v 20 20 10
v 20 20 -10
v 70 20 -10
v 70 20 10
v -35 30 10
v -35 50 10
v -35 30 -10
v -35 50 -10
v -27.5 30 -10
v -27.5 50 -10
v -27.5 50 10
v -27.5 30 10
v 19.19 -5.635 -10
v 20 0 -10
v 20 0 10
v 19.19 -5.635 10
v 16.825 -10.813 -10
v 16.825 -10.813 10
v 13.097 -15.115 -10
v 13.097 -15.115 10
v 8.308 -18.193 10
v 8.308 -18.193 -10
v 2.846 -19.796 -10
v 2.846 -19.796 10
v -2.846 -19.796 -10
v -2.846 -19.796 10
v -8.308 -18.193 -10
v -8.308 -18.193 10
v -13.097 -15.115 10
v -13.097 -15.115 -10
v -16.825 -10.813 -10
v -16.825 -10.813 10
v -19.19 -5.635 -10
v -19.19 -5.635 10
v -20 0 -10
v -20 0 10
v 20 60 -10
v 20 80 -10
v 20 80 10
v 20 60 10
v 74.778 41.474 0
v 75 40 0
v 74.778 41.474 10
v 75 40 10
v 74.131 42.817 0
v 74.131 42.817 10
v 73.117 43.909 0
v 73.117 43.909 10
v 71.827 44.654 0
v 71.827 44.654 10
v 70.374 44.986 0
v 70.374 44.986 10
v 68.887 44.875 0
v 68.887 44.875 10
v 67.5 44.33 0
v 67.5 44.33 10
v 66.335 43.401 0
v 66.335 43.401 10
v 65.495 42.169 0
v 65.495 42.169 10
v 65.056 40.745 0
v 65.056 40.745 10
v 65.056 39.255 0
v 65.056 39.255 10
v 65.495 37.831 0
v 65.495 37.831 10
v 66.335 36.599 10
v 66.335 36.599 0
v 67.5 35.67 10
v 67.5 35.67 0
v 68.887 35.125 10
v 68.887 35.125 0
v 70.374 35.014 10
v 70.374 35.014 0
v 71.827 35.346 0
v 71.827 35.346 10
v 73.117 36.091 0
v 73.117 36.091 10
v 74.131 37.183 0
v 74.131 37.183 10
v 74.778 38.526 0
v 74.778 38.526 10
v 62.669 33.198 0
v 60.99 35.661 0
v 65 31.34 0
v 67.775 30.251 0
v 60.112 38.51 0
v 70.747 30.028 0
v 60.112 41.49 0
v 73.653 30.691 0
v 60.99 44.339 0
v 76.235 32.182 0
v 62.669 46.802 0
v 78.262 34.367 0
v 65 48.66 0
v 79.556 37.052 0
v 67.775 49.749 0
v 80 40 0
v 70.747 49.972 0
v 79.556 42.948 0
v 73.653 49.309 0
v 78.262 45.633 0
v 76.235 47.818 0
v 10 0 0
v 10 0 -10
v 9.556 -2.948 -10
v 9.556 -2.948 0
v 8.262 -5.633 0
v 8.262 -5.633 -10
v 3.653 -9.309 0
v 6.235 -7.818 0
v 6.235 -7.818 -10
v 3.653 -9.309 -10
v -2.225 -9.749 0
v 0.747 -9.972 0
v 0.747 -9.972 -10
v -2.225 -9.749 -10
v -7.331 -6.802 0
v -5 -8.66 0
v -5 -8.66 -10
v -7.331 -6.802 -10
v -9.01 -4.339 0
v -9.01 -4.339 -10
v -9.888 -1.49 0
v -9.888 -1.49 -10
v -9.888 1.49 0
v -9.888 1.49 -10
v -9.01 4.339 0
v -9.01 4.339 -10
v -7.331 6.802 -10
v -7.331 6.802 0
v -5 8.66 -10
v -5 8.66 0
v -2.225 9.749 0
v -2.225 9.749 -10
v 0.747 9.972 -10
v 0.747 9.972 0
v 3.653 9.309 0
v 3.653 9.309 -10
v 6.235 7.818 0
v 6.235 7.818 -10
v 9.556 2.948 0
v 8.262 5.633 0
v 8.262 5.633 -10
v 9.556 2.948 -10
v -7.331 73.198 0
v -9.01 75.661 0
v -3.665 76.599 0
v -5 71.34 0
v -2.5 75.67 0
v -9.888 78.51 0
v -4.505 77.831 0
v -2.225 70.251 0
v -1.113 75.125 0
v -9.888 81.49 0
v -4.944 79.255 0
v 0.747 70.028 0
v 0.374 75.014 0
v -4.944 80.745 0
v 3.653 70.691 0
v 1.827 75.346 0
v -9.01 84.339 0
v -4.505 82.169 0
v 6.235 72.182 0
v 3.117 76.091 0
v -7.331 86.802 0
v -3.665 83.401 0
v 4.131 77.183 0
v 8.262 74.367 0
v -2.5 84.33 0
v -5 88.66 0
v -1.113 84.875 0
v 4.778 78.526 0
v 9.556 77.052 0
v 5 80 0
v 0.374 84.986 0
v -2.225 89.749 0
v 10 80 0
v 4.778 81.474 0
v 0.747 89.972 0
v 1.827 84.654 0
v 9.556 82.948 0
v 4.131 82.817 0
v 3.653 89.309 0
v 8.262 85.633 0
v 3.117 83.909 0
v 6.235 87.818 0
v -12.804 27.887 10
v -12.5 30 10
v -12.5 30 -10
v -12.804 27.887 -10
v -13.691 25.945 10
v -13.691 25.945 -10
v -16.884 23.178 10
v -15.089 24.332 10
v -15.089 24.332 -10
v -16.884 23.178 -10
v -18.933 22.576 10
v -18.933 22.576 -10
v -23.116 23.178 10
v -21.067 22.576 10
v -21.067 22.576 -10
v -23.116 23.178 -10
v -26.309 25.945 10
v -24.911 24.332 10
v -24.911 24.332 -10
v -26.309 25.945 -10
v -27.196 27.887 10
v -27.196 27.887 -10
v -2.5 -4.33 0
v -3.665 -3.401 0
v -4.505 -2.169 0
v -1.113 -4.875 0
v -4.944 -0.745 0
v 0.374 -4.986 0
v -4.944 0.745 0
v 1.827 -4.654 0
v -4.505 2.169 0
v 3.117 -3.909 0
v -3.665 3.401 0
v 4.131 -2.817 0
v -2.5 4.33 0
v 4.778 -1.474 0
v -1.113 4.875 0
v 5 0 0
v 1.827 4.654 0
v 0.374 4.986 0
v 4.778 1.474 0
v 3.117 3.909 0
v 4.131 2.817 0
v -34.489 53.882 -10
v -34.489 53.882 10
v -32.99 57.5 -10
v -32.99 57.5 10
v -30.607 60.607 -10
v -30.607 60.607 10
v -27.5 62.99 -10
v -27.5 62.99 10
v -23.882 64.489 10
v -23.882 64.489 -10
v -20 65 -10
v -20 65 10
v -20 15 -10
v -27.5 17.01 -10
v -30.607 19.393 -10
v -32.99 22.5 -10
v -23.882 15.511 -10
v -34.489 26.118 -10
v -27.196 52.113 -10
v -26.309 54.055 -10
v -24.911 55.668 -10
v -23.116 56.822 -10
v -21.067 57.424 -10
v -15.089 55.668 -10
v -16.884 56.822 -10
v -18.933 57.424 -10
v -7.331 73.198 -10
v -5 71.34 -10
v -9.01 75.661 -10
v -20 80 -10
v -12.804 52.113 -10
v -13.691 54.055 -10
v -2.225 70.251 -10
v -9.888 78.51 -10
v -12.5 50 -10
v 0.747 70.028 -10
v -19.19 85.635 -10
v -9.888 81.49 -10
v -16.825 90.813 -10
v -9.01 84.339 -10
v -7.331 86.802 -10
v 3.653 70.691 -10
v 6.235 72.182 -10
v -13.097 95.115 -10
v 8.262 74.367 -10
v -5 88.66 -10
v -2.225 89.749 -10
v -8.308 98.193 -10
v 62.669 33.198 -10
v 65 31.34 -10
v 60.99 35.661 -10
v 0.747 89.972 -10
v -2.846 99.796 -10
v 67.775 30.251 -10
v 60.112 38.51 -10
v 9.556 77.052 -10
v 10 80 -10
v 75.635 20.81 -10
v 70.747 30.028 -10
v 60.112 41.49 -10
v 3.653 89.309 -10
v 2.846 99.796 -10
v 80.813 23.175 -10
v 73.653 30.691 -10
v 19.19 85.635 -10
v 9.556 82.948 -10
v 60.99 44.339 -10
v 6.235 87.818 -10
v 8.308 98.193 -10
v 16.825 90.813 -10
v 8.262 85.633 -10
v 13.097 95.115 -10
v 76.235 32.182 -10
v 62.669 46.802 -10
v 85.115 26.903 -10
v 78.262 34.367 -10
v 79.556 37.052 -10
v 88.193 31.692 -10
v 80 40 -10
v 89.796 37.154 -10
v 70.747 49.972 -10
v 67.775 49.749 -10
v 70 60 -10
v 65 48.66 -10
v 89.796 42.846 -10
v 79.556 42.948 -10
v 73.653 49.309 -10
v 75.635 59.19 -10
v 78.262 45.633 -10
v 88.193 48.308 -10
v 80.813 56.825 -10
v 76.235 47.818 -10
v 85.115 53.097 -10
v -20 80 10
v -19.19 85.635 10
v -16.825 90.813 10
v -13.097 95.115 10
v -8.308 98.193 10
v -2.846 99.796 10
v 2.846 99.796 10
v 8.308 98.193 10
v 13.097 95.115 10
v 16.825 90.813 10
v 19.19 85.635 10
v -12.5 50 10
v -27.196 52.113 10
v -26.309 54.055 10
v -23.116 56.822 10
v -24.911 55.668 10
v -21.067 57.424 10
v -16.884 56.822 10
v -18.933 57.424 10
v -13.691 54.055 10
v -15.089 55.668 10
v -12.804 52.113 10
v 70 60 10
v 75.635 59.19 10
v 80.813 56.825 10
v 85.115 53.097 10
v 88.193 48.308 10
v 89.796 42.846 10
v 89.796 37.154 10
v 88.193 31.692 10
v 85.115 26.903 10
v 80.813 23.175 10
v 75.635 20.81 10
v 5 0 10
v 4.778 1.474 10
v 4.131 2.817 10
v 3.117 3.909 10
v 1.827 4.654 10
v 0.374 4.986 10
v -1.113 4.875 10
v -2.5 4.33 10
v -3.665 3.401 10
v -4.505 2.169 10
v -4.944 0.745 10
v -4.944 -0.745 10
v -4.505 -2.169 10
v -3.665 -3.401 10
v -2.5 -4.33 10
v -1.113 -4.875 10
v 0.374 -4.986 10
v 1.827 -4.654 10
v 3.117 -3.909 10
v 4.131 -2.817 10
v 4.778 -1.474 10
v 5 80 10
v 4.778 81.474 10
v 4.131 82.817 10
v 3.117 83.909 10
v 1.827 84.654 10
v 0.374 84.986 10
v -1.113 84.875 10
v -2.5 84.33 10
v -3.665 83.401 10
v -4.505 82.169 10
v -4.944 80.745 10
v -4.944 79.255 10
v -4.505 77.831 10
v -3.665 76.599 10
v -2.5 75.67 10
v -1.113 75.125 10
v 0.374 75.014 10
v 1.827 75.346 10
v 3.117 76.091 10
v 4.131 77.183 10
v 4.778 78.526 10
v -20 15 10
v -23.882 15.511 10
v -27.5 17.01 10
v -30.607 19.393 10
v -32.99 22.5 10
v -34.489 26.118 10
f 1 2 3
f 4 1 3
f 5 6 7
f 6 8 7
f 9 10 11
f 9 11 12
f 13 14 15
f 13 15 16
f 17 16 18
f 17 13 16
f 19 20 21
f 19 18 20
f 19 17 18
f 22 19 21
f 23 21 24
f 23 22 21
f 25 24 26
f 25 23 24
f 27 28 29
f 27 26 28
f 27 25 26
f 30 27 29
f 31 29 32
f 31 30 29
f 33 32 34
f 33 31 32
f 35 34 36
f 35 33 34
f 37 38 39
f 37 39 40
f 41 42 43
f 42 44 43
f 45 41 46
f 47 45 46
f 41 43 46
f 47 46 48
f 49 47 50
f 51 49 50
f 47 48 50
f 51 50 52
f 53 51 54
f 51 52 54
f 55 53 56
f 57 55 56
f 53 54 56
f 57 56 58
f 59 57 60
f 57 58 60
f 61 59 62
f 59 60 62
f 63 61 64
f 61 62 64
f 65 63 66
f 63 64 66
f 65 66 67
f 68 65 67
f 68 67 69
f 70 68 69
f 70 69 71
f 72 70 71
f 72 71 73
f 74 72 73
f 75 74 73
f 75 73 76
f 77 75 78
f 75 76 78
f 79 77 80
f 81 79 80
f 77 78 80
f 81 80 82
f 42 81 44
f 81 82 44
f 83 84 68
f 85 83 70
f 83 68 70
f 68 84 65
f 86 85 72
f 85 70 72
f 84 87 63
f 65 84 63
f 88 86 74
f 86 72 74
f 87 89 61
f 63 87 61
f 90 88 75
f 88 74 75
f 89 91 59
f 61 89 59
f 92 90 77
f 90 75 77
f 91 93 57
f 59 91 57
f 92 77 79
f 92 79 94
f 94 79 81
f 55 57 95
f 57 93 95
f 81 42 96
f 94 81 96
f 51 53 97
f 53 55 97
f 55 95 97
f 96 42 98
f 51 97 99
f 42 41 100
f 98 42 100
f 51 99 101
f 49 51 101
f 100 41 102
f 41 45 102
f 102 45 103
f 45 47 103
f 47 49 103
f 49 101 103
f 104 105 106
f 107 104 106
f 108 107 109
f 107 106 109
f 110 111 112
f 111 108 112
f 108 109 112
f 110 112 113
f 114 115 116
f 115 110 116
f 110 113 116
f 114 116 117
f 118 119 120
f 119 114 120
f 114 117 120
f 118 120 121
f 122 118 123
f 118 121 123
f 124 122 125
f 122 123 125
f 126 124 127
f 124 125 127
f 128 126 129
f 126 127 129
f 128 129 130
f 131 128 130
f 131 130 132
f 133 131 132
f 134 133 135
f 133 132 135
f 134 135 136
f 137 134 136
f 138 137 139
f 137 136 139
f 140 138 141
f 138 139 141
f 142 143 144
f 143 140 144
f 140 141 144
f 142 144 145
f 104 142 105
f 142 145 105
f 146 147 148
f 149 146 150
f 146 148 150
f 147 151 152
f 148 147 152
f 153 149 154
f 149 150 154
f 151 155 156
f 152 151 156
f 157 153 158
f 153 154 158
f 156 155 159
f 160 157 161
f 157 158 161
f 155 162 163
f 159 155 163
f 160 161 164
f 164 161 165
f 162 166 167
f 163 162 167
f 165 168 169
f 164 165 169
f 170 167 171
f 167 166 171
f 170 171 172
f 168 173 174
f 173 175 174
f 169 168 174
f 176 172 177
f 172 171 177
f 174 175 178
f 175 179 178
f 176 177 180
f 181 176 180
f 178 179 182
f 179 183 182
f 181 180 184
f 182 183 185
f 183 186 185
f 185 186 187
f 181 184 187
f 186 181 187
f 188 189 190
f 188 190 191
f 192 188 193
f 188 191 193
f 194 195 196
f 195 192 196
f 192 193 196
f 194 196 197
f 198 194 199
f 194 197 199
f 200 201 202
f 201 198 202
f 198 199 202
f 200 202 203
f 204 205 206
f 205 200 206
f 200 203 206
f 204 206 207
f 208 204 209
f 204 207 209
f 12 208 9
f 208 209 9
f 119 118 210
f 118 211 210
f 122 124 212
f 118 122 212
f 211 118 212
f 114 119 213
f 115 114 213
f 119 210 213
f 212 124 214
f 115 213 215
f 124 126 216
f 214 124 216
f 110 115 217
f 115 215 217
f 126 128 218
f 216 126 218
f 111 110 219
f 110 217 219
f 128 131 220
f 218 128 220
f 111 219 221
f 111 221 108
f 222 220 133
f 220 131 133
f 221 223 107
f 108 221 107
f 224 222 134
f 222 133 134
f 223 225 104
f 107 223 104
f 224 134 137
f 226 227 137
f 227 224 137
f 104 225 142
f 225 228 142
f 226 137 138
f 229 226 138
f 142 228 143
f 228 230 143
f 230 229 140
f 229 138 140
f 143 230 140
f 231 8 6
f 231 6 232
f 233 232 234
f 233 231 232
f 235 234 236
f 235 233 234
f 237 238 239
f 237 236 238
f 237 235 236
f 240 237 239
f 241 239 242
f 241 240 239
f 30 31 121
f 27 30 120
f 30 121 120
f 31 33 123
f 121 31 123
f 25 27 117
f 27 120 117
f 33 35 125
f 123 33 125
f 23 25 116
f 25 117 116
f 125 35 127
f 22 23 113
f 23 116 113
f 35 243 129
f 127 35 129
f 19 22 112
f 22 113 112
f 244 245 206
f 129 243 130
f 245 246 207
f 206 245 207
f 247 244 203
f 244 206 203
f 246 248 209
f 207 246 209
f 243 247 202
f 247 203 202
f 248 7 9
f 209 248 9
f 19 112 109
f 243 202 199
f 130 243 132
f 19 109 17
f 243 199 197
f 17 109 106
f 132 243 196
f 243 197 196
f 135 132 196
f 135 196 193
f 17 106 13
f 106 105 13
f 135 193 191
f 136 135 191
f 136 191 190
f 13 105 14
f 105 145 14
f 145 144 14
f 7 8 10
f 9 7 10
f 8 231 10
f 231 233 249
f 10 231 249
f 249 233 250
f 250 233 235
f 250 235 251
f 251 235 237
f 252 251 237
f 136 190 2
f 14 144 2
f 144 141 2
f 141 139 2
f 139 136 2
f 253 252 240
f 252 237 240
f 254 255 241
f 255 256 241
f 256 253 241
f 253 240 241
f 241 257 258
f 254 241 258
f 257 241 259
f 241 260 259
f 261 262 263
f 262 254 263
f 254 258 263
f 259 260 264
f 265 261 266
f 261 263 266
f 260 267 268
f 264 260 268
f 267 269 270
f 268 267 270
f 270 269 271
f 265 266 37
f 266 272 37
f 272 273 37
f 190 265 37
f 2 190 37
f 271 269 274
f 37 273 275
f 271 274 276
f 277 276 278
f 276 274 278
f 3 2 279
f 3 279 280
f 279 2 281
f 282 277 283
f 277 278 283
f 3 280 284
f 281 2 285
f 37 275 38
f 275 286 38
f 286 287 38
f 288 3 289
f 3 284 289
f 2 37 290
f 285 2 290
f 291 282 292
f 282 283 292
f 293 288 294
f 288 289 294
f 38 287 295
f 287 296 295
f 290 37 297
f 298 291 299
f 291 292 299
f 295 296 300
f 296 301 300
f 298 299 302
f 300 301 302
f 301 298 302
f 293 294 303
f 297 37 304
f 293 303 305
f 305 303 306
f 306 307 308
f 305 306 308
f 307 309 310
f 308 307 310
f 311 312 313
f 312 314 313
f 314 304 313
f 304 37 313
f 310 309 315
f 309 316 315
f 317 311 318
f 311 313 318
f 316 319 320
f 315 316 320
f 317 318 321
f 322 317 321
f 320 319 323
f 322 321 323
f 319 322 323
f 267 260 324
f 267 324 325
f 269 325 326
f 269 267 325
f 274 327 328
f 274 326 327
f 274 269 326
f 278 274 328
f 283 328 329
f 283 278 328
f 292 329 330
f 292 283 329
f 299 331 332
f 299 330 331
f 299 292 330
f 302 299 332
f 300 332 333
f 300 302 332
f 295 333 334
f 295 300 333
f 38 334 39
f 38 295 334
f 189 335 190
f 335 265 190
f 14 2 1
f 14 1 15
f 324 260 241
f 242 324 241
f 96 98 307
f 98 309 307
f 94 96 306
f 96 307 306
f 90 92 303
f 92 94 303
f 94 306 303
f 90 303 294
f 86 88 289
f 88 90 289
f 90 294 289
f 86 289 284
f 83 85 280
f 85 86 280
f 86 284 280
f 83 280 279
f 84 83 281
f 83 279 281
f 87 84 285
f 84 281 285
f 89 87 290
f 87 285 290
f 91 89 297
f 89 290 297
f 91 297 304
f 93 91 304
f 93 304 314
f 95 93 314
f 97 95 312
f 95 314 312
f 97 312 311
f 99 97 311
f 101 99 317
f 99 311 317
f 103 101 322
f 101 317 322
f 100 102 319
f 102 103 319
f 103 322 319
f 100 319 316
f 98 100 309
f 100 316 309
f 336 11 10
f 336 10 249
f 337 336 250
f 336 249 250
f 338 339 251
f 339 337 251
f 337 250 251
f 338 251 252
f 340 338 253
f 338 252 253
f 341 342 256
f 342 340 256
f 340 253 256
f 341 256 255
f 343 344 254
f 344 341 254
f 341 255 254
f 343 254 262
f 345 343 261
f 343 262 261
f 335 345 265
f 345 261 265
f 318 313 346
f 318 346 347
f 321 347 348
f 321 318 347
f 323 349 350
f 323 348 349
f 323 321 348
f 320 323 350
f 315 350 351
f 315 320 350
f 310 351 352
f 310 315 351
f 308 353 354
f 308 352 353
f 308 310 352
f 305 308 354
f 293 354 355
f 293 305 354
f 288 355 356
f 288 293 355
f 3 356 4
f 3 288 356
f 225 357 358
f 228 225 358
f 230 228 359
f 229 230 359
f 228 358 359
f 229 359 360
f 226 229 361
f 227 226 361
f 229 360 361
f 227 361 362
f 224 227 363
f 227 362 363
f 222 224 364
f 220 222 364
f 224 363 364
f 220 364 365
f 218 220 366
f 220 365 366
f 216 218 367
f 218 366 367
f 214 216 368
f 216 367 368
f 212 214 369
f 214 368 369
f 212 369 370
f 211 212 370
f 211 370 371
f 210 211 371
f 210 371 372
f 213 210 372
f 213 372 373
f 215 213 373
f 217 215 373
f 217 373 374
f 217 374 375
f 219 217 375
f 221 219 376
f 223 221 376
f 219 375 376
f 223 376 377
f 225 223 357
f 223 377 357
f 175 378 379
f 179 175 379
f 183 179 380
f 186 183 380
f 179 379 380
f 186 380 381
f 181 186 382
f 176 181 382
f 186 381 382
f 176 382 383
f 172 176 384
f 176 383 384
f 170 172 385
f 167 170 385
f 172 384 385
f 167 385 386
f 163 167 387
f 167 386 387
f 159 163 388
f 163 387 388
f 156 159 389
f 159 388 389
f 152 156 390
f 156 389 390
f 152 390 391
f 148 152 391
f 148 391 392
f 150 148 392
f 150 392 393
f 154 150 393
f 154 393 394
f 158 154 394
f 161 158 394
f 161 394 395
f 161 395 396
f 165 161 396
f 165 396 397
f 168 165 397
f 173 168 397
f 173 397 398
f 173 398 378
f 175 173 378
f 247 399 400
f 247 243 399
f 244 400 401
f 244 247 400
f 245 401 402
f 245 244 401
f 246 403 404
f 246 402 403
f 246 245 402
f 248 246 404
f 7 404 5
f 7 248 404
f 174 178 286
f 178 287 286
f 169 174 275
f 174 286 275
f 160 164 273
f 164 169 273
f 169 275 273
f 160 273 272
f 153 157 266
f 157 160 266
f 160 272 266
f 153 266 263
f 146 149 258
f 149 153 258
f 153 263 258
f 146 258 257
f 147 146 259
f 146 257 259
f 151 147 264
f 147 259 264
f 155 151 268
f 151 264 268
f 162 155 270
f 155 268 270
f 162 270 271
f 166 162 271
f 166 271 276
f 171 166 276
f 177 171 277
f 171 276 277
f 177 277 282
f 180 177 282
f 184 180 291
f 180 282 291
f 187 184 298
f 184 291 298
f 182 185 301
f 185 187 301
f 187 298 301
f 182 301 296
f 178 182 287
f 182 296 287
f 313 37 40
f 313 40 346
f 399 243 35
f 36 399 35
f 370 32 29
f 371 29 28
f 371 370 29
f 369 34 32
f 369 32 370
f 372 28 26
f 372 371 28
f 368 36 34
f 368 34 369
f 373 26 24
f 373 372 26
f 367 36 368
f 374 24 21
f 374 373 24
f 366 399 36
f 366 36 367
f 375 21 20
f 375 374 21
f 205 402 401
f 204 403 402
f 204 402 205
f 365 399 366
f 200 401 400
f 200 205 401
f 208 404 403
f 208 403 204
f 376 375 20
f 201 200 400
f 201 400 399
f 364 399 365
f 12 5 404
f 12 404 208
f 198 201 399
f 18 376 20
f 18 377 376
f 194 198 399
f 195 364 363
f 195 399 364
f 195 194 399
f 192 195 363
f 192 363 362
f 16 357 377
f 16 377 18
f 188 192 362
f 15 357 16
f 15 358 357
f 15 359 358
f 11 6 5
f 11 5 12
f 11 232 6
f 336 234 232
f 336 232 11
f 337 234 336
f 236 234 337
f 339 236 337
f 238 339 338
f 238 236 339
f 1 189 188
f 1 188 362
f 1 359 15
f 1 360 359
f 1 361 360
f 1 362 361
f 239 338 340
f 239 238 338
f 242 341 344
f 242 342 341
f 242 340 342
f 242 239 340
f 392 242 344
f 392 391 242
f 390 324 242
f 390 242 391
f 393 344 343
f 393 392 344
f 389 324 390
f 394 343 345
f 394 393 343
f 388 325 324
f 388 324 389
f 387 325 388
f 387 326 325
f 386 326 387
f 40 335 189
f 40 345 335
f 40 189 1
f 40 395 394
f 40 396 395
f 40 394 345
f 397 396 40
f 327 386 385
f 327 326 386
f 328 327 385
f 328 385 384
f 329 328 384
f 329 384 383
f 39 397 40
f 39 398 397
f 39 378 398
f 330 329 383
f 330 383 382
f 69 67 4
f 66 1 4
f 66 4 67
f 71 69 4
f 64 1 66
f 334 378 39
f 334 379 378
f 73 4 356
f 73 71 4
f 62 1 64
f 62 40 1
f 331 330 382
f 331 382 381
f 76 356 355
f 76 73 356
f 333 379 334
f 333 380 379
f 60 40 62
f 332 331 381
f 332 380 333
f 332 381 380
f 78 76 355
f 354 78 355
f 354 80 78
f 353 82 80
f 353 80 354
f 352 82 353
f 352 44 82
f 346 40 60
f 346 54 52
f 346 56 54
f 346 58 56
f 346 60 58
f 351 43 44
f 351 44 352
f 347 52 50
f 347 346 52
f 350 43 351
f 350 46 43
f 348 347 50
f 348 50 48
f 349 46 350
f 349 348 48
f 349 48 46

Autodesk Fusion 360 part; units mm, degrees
sketch "Sketch1" plane through (0, 0, 0) normal (0, 0, 1) x (1, 0, 0)
  circle A0 centre (0, 80) radius 10
  circle A1 centre (0, 80) radius 15
  circle A2 centre (70, 40) radius 10
  circle A3 centre (70, 40) radius 15
  circle A4 centre (0, 0) radius 10
  circle A5 centre (0, 0) radius 15
  line L0 (20, 60) -> (70, 60)
  arc A6 (20, 80) -> (-20, 80) centre (0, 80) ccw
  arc A7 (-20, 0) -> (20, 0) centre (0, 0) ccw
  line L1 (20, 20) -> (70, 20)
  arc A8 (70, 20) -> (70, 60) centre (70, 40) ccw
  line L2 (20, 80) -> (20, 60)
  line L3 (20, 20) -> (20, 0)
  line L4 (-35, 50) -> (-35, 30)
  arc A9 (-35, 30) -> (-20, 15) centre (-20, 30) ccw
  arc A10 (-20, 65) -> (-35, 50) centre (-20, 50) ccw
  line L5 (-20, 80) -> (-20, 65)
  line L6 (-20, 15) -> (-20, 0)
  line L7 (-12.5, 50) -> (-12.5, 30)
  line L8 (-27.5, 50) -> (-27.5, 30)
  arc A11 (-12.5, 50) -> (-27.5, 50) centre (-20, 50) ccw
  arc A12 (-27.5, 30) -> (-12.5, 30) centre (-20, 30) ccw
  dimension "d1" = 20
  dimension "d2" = 30
  dimension "d3" = 40
  dimension "d4" = 20
  dimension "d5" = 30
  dimension "d6" = 40
  dimension "d7" = 20
  dimension "d8" = 30
  dimension "d9" = 40
  dimension "d10" = 80
  dimension "d11" = 40
  dimension "d12" = 70
  dimension "d13" = 40
  dimension "d14" = 20
  dimension "d16" = 30
  dimension "d18" = 30
  dimension "d19" = 20
  dimension "d20" = 20
  dimension "d21" = 30
  dimension "d22" = 15
  dimension "d23" = 15
  dimension "d24" = 20
  dimension "d25" = 30
  dimension "d27" = 12.5
  dimension "d28" = 27.5
extrude "Extrude1" add sketch "Sketch1" along normal mid plane 20 contours A1 | A3 | A5 | L0 A6 A7 L1 A8 L2 L3 L4 A9 A10 L5 L6
sketch "Sketch2" plane through (0, 0, 10) normal (0, 0, 1) x (1, 0, 0)
  circle A0 centre (0, 0) radius 10
  circle A1 centre (0, 80) radius 10
  circle A2 centre (70, 40) radius 10
  arc A3 (-12.5, 50) -> (-27.5, 50) centre (-20, 50) ccw
  line L0 (-12.5, 50) -> (-12.5, 30)
  arc A4 (-27.5, 30) -> (-12.5, 30) centre (-20, 30) ccw
  line L1 (-27.5, 30) -> (-27.5, 50)
  arc A5 (20, 80) -> (-20, 80) centre (0, 80) ccw
  line L2 (-20, 80) -> (-20, 65)
  arc A6 (-20, 65) -> (-35, 50) centre (-20, 50) ccw
  line L3 (-35, 50) -> (-35, 30)
  arc A7 (-35, 30) -> (-20, 15) centre (-20, 30) ccw
  line L4 (-20, 15) -> (-20, 0)
  arc A8 (-20, 0) -> (20, 0) centre (0, 0) ccw
  line L5 (20, 0) -> (20, 20)
  line L6 (20, 20) -> (70, 20)
  arc A9 (70, 20) -> (70, 60) centre (70, 40) ccw
  line L7 (70, 60) -> (20, 60)
  line L8 (20, 60) -> (20, 80)
  circle A10 centre (0, 80) radius 5
  circle A11 centre (70, 40) radius 5
  circle A12 centre (0, 0) radius 5
  dimension "d31" = 10
  dimension "d32" = 10
  dimension "d33" = 10
extrude "Extrude2" add sketch "Sketch2" against normal blind 10 contours A0 | A1 | A2
